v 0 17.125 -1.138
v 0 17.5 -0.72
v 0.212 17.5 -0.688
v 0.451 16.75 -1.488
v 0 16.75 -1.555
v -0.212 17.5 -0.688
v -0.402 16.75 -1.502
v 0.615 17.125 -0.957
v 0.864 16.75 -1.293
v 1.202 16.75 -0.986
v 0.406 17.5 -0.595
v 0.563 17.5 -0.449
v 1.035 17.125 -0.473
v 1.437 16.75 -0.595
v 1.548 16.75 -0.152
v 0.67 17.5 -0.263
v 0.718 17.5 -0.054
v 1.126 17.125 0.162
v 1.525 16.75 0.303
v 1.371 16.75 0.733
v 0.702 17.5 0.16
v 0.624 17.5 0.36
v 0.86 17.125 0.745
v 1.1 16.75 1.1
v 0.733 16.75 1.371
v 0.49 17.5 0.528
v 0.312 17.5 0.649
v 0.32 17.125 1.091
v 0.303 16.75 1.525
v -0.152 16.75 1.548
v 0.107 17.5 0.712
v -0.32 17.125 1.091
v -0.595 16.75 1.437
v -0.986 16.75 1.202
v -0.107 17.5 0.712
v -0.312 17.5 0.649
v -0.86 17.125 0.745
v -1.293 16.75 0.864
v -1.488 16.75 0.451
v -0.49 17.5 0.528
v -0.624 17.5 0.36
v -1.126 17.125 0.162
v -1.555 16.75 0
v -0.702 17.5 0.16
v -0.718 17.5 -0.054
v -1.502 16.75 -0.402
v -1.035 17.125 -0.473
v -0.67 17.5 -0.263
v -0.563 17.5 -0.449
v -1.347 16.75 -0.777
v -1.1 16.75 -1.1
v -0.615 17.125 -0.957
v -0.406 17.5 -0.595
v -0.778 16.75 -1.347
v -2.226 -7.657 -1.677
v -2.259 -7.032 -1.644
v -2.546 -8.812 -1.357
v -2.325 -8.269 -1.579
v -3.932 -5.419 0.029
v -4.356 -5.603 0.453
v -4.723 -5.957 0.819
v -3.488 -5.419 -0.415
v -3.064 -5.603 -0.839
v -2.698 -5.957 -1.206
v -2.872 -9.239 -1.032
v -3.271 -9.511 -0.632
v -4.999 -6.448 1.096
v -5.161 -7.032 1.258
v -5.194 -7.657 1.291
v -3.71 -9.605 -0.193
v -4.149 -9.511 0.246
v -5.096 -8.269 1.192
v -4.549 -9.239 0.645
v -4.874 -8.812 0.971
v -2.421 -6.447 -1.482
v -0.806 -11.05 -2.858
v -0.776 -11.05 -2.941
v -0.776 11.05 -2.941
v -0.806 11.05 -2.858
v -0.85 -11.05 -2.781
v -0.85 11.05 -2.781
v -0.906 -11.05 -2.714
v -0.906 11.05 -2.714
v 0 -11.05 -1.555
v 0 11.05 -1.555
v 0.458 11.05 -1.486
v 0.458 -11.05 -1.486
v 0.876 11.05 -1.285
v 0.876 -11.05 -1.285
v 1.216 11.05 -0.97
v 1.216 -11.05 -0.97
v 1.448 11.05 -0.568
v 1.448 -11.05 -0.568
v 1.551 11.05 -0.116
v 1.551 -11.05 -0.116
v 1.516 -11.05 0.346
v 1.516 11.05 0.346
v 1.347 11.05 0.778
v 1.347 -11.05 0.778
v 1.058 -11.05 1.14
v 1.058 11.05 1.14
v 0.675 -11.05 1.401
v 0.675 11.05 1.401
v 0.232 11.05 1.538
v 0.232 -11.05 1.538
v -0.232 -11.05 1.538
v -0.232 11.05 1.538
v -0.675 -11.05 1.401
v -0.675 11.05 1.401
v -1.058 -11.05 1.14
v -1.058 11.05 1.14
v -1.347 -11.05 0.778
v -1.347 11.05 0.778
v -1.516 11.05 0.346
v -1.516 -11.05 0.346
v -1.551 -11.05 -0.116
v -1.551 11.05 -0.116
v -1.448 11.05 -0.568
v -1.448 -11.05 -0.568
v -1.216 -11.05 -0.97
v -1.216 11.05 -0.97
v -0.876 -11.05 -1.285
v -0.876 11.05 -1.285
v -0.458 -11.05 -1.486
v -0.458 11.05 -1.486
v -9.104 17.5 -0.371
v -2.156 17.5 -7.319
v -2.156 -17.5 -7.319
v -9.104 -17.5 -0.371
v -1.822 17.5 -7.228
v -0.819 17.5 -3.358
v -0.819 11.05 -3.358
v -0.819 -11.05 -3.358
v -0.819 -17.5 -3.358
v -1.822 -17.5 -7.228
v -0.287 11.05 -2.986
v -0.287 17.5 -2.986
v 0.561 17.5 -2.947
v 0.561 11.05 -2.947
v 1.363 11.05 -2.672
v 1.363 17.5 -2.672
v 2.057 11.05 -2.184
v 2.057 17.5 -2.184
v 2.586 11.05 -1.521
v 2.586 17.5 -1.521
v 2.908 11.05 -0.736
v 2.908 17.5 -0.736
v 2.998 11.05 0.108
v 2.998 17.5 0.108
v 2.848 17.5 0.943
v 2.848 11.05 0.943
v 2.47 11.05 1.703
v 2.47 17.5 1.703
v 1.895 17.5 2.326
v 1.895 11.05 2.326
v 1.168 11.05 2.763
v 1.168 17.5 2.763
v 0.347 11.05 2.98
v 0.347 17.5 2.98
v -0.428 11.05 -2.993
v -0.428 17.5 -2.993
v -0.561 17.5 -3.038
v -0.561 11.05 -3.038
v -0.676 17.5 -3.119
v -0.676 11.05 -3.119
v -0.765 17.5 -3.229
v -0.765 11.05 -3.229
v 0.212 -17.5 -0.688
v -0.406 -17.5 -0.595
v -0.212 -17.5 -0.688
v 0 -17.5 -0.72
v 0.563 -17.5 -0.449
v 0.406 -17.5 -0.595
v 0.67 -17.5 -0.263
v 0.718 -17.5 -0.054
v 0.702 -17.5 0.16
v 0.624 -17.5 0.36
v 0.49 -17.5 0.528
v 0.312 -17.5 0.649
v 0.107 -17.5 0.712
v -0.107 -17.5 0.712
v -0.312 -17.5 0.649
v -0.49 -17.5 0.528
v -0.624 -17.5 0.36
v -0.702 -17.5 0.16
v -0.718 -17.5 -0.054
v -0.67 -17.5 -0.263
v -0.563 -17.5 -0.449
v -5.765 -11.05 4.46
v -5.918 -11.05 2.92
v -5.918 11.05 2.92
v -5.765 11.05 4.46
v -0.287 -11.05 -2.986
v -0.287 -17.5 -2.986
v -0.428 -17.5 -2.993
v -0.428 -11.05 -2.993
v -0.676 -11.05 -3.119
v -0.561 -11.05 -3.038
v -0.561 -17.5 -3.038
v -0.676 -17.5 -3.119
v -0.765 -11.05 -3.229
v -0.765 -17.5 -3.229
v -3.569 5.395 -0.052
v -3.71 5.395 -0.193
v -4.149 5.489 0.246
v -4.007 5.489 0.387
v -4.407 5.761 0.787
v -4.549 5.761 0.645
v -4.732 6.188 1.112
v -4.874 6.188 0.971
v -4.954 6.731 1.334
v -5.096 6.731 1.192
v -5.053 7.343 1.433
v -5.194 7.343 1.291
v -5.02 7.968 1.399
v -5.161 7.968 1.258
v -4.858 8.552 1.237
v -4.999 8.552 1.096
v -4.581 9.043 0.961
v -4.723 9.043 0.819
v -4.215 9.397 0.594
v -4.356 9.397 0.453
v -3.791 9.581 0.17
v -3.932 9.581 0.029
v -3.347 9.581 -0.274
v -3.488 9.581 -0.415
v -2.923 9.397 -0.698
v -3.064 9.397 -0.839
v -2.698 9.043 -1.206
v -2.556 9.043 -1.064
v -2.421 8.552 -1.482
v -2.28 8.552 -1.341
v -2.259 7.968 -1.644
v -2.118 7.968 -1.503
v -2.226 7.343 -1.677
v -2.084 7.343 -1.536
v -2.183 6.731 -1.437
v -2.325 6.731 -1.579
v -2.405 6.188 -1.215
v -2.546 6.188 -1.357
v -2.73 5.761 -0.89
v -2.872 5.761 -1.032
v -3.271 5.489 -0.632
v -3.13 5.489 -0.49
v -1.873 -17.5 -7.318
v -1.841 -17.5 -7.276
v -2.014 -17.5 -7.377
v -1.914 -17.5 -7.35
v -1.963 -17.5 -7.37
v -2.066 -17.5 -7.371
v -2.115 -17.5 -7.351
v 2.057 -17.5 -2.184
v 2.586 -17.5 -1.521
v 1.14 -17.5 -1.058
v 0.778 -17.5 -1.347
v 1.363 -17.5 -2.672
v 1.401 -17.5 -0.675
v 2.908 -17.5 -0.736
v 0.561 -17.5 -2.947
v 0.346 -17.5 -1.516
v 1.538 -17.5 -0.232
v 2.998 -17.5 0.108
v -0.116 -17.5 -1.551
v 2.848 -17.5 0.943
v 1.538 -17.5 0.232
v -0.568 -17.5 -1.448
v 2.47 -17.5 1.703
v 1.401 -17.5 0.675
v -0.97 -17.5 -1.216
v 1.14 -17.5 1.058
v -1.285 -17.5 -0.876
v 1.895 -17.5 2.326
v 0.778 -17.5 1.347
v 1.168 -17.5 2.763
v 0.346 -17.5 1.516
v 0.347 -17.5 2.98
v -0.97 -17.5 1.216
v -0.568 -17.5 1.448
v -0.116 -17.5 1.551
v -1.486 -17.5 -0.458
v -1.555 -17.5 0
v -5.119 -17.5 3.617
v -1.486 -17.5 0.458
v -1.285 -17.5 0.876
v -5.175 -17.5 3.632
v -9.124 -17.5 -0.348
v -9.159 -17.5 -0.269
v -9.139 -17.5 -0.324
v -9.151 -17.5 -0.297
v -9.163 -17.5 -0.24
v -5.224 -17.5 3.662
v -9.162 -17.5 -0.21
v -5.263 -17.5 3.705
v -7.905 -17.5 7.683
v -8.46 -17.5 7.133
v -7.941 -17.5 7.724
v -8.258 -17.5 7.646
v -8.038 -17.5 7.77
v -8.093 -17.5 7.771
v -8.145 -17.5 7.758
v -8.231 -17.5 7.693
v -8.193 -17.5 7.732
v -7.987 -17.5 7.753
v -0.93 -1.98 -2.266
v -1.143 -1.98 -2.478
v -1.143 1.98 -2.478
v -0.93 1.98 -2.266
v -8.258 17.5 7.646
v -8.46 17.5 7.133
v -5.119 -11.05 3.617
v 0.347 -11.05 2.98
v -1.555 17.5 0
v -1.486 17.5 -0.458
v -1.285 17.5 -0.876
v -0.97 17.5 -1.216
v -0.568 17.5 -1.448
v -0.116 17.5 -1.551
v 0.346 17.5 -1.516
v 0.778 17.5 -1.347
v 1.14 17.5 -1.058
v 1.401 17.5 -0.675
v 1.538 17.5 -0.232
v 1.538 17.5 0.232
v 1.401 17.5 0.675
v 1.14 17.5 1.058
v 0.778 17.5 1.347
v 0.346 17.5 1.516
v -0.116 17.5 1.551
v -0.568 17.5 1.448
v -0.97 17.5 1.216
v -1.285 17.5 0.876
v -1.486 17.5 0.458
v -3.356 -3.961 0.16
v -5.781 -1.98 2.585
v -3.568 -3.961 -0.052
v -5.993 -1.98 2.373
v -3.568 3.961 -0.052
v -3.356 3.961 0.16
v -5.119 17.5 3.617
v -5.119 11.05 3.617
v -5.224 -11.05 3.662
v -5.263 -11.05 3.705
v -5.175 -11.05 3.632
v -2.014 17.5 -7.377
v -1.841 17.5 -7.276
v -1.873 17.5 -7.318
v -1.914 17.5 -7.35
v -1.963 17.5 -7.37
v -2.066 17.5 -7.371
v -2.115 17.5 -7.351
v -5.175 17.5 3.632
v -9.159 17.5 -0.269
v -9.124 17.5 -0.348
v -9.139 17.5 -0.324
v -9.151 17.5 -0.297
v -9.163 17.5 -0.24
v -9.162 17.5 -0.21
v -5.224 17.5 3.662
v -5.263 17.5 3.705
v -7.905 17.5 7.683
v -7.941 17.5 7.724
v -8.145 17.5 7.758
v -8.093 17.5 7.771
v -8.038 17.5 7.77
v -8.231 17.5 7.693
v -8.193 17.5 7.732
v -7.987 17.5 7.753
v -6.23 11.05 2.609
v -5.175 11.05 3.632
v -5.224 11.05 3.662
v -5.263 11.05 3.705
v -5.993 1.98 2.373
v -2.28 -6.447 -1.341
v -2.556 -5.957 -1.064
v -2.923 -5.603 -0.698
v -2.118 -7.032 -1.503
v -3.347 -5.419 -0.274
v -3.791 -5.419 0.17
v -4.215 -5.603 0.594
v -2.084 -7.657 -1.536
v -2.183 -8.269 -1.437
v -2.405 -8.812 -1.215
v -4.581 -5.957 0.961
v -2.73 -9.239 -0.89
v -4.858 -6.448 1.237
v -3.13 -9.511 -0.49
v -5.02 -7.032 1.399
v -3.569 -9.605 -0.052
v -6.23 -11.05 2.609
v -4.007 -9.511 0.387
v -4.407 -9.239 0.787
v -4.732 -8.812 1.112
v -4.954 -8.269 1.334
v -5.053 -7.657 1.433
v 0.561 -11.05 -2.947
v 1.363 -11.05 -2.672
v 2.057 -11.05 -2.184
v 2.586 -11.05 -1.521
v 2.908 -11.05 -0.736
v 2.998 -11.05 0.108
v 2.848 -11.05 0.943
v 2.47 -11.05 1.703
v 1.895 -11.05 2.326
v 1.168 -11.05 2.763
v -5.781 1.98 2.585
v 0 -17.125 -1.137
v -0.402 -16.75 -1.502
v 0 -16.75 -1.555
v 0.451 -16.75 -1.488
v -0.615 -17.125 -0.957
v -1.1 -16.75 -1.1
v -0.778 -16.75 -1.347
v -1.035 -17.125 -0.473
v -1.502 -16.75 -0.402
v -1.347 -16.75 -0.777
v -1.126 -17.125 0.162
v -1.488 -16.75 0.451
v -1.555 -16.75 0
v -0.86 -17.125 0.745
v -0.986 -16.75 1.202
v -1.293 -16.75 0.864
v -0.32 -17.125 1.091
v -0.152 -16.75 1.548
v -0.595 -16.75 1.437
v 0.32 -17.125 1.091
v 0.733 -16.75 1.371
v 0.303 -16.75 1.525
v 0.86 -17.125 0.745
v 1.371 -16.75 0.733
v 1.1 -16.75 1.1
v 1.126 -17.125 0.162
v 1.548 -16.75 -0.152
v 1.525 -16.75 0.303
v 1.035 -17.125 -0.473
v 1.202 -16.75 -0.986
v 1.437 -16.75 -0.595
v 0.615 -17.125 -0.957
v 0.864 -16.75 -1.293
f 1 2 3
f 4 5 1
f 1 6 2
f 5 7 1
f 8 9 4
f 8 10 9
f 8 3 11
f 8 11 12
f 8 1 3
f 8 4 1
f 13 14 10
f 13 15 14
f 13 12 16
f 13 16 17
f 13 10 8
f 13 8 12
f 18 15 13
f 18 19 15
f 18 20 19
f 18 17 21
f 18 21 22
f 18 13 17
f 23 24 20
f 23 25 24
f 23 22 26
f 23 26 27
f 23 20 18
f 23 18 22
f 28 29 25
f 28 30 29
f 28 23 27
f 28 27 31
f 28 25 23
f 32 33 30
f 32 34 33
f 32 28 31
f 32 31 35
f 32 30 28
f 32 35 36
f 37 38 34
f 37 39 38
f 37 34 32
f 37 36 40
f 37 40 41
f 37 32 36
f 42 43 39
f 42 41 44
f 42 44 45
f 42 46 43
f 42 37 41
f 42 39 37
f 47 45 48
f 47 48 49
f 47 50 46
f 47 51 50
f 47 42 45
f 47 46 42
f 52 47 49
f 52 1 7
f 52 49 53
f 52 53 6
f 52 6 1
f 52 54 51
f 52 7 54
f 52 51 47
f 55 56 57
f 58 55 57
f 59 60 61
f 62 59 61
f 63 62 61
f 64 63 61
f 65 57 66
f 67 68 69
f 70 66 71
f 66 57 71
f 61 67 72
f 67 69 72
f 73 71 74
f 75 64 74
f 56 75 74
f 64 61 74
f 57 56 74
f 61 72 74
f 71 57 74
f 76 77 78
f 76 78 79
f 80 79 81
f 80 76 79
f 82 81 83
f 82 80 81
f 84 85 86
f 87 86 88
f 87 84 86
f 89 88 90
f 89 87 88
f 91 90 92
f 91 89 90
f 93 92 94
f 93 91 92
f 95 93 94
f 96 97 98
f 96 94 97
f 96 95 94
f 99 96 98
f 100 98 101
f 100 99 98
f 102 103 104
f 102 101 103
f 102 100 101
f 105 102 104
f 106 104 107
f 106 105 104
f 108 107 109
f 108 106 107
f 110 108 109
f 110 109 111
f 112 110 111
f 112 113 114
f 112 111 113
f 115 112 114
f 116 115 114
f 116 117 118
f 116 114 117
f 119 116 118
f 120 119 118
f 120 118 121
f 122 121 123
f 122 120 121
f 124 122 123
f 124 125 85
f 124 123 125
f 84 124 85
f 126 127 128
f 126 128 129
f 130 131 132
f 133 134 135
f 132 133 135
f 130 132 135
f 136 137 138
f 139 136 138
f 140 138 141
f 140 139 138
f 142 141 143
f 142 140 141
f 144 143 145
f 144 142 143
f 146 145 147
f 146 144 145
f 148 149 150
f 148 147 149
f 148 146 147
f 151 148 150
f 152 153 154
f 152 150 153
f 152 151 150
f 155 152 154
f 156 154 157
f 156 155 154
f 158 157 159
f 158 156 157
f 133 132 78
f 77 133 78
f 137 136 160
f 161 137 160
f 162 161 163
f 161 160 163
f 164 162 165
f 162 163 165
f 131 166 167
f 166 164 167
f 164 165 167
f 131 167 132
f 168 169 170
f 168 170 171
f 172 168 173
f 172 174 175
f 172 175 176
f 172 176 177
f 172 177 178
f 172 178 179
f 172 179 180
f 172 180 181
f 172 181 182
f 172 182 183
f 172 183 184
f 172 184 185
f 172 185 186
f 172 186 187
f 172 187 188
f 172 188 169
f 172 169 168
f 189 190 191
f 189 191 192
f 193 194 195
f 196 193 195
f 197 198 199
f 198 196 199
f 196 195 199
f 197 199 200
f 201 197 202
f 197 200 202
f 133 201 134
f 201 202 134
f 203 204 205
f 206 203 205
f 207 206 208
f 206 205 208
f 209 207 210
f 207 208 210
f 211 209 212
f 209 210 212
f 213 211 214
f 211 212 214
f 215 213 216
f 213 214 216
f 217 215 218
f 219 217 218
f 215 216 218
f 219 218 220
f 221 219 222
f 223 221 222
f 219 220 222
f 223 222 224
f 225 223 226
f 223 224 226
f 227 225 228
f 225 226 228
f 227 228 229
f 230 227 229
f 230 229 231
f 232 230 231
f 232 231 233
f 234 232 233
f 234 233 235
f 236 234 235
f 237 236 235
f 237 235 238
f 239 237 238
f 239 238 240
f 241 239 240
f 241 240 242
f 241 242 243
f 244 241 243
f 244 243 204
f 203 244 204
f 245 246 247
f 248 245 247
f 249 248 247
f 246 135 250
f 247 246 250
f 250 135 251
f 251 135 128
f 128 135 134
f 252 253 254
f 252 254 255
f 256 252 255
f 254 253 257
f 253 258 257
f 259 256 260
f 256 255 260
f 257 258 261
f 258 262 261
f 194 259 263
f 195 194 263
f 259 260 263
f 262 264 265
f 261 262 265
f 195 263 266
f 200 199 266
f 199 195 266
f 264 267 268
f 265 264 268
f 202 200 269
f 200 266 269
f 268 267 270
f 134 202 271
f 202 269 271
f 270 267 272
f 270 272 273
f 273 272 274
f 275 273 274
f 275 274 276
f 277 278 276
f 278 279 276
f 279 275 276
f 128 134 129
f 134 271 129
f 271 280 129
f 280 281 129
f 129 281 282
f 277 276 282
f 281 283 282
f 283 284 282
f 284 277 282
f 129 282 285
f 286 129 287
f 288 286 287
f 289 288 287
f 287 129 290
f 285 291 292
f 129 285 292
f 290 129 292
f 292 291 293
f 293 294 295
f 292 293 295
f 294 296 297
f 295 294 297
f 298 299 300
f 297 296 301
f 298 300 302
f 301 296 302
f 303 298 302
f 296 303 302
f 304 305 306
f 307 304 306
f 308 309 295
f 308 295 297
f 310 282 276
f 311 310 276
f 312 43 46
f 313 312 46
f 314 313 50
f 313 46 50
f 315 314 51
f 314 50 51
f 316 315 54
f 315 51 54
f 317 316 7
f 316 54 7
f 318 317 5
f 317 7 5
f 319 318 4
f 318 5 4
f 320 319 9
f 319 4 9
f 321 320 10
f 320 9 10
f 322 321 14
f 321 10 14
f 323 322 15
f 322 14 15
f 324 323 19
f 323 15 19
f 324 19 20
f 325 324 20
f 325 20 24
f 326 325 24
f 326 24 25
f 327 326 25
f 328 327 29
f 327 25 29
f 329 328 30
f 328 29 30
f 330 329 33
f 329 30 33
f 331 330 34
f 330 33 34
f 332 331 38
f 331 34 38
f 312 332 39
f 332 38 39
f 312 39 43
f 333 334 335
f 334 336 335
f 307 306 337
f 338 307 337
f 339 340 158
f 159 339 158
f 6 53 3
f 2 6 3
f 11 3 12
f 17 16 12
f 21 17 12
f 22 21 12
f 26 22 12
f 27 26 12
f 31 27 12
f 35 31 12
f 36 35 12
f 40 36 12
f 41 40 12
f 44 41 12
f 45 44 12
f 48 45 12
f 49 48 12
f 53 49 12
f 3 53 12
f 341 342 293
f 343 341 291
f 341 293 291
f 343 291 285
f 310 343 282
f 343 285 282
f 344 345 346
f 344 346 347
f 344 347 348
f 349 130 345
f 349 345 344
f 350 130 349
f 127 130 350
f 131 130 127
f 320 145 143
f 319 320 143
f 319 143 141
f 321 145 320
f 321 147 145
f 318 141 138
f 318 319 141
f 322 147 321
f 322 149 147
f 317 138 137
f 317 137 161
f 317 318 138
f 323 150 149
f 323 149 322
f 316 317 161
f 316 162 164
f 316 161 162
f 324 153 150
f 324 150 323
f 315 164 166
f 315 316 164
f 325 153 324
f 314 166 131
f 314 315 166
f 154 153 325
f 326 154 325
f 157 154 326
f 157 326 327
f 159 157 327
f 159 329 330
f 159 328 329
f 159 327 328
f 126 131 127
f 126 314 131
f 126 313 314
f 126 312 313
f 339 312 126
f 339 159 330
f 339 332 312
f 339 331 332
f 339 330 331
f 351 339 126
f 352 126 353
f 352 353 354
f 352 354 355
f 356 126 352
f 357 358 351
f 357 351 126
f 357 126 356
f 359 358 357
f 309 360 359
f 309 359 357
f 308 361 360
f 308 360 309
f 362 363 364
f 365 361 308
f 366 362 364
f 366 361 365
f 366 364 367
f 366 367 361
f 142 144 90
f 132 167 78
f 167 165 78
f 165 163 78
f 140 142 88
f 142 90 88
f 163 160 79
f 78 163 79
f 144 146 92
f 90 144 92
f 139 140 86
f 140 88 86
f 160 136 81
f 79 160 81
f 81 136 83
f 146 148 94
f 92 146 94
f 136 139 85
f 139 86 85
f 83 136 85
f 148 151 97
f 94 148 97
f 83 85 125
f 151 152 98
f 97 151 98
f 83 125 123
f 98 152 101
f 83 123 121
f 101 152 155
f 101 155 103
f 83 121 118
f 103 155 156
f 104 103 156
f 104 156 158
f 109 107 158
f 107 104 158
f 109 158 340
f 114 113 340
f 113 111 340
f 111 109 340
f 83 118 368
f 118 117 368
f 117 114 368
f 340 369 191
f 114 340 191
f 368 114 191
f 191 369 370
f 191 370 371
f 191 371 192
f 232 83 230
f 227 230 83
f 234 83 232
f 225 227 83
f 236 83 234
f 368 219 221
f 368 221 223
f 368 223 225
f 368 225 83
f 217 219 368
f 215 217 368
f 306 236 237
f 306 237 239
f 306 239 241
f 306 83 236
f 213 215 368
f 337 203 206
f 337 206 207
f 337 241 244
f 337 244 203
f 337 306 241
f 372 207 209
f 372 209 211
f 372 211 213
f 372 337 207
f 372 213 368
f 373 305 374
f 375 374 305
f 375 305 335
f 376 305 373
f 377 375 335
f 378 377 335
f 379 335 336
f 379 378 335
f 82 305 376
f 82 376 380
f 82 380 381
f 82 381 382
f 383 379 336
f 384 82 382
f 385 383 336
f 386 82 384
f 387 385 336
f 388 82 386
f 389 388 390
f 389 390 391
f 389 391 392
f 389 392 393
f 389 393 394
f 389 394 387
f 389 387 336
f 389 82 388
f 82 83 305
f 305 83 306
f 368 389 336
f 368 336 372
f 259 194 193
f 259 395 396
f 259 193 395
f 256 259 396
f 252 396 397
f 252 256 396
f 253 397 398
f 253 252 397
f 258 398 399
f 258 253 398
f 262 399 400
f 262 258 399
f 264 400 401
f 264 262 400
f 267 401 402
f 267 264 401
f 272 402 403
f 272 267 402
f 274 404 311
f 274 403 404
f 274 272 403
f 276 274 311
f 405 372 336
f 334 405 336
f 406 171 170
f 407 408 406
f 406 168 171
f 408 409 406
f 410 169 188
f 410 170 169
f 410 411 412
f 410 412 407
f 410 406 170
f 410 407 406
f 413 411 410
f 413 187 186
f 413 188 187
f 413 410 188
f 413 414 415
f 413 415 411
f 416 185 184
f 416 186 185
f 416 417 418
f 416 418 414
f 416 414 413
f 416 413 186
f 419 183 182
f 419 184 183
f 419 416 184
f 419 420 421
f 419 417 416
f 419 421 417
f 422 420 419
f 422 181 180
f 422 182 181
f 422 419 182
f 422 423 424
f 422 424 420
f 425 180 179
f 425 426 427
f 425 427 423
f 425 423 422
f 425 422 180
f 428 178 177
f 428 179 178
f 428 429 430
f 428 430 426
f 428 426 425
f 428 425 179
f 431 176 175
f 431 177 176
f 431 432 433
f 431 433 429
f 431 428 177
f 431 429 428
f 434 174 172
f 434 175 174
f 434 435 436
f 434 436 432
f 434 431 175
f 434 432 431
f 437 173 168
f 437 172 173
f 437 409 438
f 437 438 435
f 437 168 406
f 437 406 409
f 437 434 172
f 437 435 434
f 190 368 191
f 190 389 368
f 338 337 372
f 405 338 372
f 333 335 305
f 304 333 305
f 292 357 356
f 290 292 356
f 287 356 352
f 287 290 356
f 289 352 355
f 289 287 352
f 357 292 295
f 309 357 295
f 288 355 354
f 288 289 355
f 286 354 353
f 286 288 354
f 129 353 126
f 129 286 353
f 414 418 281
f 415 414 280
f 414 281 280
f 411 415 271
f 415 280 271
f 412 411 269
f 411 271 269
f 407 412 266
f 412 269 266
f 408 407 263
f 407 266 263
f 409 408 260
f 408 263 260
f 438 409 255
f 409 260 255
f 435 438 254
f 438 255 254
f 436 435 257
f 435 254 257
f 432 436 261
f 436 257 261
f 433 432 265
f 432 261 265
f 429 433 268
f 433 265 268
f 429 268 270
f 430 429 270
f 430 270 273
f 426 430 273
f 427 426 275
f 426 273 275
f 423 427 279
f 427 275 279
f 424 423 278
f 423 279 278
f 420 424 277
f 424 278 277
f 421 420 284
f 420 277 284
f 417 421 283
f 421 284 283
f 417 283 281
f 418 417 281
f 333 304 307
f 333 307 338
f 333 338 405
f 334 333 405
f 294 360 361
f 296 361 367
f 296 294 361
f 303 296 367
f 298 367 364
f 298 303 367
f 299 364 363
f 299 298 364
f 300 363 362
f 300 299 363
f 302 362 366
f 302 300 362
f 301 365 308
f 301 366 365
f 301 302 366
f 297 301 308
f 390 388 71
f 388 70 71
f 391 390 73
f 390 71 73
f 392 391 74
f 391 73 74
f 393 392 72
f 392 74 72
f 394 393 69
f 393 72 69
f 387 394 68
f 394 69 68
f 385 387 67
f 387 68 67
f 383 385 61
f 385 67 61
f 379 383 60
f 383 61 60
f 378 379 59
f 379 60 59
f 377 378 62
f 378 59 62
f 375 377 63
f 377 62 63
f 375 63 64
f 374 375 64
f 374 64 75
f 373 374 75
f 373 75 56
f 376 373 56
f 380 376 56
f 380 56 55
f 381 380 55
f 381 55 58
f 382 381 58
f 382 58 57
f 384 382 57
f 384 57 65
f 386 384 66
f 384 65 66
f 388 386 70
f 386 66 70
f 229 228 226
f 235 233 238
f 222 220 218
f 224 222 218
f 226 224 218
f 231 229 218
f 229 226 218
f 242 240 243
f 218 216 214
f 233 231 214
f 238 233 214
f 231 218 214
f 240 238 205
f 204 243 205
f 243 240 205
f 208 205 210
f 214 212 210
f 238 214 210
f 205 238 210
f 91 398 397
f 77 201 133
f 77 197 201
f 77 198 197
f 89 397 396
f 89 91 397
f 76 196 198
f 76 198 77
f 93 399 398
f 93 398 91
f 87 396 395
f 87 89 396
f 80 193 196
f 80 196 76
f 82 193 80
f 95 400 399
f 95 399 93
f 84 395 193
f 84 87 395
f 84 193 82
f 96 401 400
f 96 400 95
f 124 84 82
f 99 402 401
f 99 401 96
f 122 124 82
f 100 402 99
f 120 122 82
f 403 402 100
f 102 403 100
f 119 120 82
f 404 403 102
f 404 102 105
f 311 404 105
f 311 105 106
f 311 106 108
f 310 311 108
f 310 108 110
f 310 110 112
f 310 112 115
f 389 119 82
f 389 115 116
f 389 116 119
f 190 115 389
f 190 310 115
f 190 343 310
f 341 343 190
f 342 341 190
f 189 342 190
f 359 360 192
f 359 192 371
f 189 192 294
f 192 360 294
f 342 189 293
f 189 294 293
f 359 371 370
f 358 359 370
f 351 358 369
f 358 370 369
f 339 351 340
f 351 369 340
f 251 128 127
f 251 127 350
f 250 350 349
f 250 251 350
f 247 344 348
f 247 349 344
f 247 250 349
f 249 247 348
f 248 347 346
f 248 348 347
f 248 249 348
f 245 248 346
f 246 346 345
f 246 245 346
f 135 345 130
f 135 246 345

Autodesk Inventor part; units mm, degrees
sketch "Sketch_1" plane through (0, 0, 0) normal (0, 1, 0) x (-1, 0, 0)
  line L0 (9.1622, -0.2102) -> (8.4597, 7.1326)
  line L1 (8.4597, 7.1326) -> (8.2577, 7.6457)
  arc A0 (8.2577, 7.6457) -> (7.905, 7.6831) centre (8.0716, 7.5725) ccw
  line L2 (7.905, 7.6831) -> (5.2627, 3.7047)
  arc A1 (5.1192, 3.6167) -> (5.2627, 3.7047) centre (5.0961, 3.8154) ccw
  line L3 (5.1192, 3.6167) -> (-0.3472, 2.9798)
  arc A2 (-0.3472, 2.9798) -> (0.287, -2.9862) centre (0, 0) ccw
  arc A3 (0.8188, -3.3585) -> (0.287, -2.9862) centre (0.3348, -3.4839) ccw
  line L4 (0.8188, -3.3585) -> (1.8215, -7.2275)
  arc A4 (1.8215, -7.2275) -> (2.1565, -7.3187) centre (2.0151, -7.1773) ccw
  line L5 (2.1565, -7.3187) -> (9.1045, -0.3707)
  arc A5 (9.1045, -0.3707) -> (9.1513, -0.2969) centre (8.9631, -0.2293) ccw
  arc A6 (9.1513, -0.2969) -> (9.1622, -0.2102) centre (8.9631, -0.2293) ccw
  circle A7 centre (0, 0) radius 1.555
extrude "Extrusion1" add sketch "Sketch_1" along normal mid plane 35
sketch "Sketch_2" plane through (0, 0, 0) normal (0, 1, 0) x (-1, 0, 0)
  line L0 (6.2296, 2.6092) -> (5.9185, 2.9204)
  line L1 (5.9185, 2.9204) -> (5.7646, 4.4605)
  line L2 (5.7646, 4.4605) -> (5.2627, 3.7047)
  line L3 (5.2627, 3.7047) -> (5.1192, 3.6167)
  line L4 (5.1192, 3.6167) -> (-0.3472, 2.9798)
  arc A0 (-0.3472, 2.9798) -> (0.287, -2.9862) centre (0, 0) ccw
  arc A1 (0.8188, -3.3585) -> (0.287, -2.9862) centre (0.3348, -3.4839) ccw
  line L5 (0.8188, -3.3585) -> (0.7763, -2.9407)
  arc A2 (0.9064, -2.714) -> (0.7763, -2.9407) centre (1.26, -3.0675) ccw
  line L6 (0.9064, -2.714) -> (6.2296, 2.6092)
extrude "Extrusion2" cut sketch "Sketch_2" along normal mid plane 22.1
sketch "Sketch_3" plane through (-0.9064, -11.05, -2.714) normal (0.7071, 0, 0.7071) x (-0.7071, 0, 0.7071)
  line L0 (0.334, -13.0303) -> (3.764, -15.0106)
  line L1 (3.764, -15.0106) -> (7.194, -13.0303)
  line L2 (7.194, -13.0303) -> (7.194, -9.0697)
  line L3 (7.194, -9.0697) -> (3.764, -7.0894)
  line L4 (3.764, -7.0894) -> (0.334, -9.0697)
  line L5 (0.334, -9.0697) -> (0.334, -13.0303)
extrude "Extrusion3" add sketch "Sketch_3" along normal mid plane 0.6
sketch "Sketch_4" plane through (0, 0, 0) normal (1, 0, 0) x (0, 1, 0)
  line L0 (-17.5, 0) -> (17.5, 0)
  line L1 (17.5, 0) -> (17.5, -0.72)
  line L2 (17.5, -0.72) -> (16.75, -1.555)
  line L3 (16.75, -1.555) -> (-16.75, -1.555)
  line L4 (-16.75, -1.555) -> (-17.5, -0.72)
  line L5 (-17.5, -0.72) -> (-17.5, 0)
  line L6 (-17.5, 0) -> (17.5, 0)
revolve "Revolution1" add sketch "Sketch_4" angle 360 about axis through (0, -17.5, 0) along (0, -1, 0)
sketch "Sketch5" plane through (-6.2296, -11.05, 2.6092) normal (0.7071, 0, 0.7071) x (0.7071, 0, -0.7071)
  point P0 (3.7632, 3.55)
hole "Hole1" at (-3.5687, -7.5, -0.0517) direction (-0.7071, 0, -0.7071) diameter 4.21 depth 0.2
sketch "Sketch6" plane through (-6.2296, -11.05, 2.6092) normal (0.7071, 0, 0.7071) x (0.7071, 0, -0.7071)
  point P0 (3.7632, 18.55)
hole "Hole2" at (-3.5687, 7.5, -0.0517) direction (-0.7071, 0, -0.7071) diameter 4.21 depth 0.2
ref_plane "to_bolt_XY" through (-3.5679, 0, -0.0524) normal (0.7071, 0, 0.7071) x (-0.7071, 0, 0.7071)
ref_plane "to_bolt_YZ" through (-3.5679, 0, -0.0524) normal (-0.7071, 0, 0.7071) x (0, -1, 0)
ref_plane "to_bolt_ZX" through (-3.5679, 0, -0.0524) normal (0, -1, 0) x (0.7071, 0, 0.7071)
ref_plane "to_door_XY" through (0, 0, 0) normal (0, 1, 0) x (1, 0, 0)
ref_plane "to_door_YZ" through (0, 0, 0) normal (1, 0, 0) x (0, 0, -1)
ref_plane "to_door_ZX" through (0, 0, 0) normal (0, 0, -1) x (0, 1, 0)
ref_plane "to_frame_XY" through (-5.6305, 0, -3.8447) normal (0.7071, 0, 0.7071) x (0.7071, 0, -0.7071)
ref_plane "to_frame_YZ" through (-5.6305, 0, -3.8447) normal (0.7071, 0, -0.7071) x (0, 1, 0)
ref_plane "to_frame_ZX" through (-5.6305, 0, -3.8447) normal (0, 1, 0) x (0.7071, 0, 0.7071)
properties part number "JB_HINGE"
